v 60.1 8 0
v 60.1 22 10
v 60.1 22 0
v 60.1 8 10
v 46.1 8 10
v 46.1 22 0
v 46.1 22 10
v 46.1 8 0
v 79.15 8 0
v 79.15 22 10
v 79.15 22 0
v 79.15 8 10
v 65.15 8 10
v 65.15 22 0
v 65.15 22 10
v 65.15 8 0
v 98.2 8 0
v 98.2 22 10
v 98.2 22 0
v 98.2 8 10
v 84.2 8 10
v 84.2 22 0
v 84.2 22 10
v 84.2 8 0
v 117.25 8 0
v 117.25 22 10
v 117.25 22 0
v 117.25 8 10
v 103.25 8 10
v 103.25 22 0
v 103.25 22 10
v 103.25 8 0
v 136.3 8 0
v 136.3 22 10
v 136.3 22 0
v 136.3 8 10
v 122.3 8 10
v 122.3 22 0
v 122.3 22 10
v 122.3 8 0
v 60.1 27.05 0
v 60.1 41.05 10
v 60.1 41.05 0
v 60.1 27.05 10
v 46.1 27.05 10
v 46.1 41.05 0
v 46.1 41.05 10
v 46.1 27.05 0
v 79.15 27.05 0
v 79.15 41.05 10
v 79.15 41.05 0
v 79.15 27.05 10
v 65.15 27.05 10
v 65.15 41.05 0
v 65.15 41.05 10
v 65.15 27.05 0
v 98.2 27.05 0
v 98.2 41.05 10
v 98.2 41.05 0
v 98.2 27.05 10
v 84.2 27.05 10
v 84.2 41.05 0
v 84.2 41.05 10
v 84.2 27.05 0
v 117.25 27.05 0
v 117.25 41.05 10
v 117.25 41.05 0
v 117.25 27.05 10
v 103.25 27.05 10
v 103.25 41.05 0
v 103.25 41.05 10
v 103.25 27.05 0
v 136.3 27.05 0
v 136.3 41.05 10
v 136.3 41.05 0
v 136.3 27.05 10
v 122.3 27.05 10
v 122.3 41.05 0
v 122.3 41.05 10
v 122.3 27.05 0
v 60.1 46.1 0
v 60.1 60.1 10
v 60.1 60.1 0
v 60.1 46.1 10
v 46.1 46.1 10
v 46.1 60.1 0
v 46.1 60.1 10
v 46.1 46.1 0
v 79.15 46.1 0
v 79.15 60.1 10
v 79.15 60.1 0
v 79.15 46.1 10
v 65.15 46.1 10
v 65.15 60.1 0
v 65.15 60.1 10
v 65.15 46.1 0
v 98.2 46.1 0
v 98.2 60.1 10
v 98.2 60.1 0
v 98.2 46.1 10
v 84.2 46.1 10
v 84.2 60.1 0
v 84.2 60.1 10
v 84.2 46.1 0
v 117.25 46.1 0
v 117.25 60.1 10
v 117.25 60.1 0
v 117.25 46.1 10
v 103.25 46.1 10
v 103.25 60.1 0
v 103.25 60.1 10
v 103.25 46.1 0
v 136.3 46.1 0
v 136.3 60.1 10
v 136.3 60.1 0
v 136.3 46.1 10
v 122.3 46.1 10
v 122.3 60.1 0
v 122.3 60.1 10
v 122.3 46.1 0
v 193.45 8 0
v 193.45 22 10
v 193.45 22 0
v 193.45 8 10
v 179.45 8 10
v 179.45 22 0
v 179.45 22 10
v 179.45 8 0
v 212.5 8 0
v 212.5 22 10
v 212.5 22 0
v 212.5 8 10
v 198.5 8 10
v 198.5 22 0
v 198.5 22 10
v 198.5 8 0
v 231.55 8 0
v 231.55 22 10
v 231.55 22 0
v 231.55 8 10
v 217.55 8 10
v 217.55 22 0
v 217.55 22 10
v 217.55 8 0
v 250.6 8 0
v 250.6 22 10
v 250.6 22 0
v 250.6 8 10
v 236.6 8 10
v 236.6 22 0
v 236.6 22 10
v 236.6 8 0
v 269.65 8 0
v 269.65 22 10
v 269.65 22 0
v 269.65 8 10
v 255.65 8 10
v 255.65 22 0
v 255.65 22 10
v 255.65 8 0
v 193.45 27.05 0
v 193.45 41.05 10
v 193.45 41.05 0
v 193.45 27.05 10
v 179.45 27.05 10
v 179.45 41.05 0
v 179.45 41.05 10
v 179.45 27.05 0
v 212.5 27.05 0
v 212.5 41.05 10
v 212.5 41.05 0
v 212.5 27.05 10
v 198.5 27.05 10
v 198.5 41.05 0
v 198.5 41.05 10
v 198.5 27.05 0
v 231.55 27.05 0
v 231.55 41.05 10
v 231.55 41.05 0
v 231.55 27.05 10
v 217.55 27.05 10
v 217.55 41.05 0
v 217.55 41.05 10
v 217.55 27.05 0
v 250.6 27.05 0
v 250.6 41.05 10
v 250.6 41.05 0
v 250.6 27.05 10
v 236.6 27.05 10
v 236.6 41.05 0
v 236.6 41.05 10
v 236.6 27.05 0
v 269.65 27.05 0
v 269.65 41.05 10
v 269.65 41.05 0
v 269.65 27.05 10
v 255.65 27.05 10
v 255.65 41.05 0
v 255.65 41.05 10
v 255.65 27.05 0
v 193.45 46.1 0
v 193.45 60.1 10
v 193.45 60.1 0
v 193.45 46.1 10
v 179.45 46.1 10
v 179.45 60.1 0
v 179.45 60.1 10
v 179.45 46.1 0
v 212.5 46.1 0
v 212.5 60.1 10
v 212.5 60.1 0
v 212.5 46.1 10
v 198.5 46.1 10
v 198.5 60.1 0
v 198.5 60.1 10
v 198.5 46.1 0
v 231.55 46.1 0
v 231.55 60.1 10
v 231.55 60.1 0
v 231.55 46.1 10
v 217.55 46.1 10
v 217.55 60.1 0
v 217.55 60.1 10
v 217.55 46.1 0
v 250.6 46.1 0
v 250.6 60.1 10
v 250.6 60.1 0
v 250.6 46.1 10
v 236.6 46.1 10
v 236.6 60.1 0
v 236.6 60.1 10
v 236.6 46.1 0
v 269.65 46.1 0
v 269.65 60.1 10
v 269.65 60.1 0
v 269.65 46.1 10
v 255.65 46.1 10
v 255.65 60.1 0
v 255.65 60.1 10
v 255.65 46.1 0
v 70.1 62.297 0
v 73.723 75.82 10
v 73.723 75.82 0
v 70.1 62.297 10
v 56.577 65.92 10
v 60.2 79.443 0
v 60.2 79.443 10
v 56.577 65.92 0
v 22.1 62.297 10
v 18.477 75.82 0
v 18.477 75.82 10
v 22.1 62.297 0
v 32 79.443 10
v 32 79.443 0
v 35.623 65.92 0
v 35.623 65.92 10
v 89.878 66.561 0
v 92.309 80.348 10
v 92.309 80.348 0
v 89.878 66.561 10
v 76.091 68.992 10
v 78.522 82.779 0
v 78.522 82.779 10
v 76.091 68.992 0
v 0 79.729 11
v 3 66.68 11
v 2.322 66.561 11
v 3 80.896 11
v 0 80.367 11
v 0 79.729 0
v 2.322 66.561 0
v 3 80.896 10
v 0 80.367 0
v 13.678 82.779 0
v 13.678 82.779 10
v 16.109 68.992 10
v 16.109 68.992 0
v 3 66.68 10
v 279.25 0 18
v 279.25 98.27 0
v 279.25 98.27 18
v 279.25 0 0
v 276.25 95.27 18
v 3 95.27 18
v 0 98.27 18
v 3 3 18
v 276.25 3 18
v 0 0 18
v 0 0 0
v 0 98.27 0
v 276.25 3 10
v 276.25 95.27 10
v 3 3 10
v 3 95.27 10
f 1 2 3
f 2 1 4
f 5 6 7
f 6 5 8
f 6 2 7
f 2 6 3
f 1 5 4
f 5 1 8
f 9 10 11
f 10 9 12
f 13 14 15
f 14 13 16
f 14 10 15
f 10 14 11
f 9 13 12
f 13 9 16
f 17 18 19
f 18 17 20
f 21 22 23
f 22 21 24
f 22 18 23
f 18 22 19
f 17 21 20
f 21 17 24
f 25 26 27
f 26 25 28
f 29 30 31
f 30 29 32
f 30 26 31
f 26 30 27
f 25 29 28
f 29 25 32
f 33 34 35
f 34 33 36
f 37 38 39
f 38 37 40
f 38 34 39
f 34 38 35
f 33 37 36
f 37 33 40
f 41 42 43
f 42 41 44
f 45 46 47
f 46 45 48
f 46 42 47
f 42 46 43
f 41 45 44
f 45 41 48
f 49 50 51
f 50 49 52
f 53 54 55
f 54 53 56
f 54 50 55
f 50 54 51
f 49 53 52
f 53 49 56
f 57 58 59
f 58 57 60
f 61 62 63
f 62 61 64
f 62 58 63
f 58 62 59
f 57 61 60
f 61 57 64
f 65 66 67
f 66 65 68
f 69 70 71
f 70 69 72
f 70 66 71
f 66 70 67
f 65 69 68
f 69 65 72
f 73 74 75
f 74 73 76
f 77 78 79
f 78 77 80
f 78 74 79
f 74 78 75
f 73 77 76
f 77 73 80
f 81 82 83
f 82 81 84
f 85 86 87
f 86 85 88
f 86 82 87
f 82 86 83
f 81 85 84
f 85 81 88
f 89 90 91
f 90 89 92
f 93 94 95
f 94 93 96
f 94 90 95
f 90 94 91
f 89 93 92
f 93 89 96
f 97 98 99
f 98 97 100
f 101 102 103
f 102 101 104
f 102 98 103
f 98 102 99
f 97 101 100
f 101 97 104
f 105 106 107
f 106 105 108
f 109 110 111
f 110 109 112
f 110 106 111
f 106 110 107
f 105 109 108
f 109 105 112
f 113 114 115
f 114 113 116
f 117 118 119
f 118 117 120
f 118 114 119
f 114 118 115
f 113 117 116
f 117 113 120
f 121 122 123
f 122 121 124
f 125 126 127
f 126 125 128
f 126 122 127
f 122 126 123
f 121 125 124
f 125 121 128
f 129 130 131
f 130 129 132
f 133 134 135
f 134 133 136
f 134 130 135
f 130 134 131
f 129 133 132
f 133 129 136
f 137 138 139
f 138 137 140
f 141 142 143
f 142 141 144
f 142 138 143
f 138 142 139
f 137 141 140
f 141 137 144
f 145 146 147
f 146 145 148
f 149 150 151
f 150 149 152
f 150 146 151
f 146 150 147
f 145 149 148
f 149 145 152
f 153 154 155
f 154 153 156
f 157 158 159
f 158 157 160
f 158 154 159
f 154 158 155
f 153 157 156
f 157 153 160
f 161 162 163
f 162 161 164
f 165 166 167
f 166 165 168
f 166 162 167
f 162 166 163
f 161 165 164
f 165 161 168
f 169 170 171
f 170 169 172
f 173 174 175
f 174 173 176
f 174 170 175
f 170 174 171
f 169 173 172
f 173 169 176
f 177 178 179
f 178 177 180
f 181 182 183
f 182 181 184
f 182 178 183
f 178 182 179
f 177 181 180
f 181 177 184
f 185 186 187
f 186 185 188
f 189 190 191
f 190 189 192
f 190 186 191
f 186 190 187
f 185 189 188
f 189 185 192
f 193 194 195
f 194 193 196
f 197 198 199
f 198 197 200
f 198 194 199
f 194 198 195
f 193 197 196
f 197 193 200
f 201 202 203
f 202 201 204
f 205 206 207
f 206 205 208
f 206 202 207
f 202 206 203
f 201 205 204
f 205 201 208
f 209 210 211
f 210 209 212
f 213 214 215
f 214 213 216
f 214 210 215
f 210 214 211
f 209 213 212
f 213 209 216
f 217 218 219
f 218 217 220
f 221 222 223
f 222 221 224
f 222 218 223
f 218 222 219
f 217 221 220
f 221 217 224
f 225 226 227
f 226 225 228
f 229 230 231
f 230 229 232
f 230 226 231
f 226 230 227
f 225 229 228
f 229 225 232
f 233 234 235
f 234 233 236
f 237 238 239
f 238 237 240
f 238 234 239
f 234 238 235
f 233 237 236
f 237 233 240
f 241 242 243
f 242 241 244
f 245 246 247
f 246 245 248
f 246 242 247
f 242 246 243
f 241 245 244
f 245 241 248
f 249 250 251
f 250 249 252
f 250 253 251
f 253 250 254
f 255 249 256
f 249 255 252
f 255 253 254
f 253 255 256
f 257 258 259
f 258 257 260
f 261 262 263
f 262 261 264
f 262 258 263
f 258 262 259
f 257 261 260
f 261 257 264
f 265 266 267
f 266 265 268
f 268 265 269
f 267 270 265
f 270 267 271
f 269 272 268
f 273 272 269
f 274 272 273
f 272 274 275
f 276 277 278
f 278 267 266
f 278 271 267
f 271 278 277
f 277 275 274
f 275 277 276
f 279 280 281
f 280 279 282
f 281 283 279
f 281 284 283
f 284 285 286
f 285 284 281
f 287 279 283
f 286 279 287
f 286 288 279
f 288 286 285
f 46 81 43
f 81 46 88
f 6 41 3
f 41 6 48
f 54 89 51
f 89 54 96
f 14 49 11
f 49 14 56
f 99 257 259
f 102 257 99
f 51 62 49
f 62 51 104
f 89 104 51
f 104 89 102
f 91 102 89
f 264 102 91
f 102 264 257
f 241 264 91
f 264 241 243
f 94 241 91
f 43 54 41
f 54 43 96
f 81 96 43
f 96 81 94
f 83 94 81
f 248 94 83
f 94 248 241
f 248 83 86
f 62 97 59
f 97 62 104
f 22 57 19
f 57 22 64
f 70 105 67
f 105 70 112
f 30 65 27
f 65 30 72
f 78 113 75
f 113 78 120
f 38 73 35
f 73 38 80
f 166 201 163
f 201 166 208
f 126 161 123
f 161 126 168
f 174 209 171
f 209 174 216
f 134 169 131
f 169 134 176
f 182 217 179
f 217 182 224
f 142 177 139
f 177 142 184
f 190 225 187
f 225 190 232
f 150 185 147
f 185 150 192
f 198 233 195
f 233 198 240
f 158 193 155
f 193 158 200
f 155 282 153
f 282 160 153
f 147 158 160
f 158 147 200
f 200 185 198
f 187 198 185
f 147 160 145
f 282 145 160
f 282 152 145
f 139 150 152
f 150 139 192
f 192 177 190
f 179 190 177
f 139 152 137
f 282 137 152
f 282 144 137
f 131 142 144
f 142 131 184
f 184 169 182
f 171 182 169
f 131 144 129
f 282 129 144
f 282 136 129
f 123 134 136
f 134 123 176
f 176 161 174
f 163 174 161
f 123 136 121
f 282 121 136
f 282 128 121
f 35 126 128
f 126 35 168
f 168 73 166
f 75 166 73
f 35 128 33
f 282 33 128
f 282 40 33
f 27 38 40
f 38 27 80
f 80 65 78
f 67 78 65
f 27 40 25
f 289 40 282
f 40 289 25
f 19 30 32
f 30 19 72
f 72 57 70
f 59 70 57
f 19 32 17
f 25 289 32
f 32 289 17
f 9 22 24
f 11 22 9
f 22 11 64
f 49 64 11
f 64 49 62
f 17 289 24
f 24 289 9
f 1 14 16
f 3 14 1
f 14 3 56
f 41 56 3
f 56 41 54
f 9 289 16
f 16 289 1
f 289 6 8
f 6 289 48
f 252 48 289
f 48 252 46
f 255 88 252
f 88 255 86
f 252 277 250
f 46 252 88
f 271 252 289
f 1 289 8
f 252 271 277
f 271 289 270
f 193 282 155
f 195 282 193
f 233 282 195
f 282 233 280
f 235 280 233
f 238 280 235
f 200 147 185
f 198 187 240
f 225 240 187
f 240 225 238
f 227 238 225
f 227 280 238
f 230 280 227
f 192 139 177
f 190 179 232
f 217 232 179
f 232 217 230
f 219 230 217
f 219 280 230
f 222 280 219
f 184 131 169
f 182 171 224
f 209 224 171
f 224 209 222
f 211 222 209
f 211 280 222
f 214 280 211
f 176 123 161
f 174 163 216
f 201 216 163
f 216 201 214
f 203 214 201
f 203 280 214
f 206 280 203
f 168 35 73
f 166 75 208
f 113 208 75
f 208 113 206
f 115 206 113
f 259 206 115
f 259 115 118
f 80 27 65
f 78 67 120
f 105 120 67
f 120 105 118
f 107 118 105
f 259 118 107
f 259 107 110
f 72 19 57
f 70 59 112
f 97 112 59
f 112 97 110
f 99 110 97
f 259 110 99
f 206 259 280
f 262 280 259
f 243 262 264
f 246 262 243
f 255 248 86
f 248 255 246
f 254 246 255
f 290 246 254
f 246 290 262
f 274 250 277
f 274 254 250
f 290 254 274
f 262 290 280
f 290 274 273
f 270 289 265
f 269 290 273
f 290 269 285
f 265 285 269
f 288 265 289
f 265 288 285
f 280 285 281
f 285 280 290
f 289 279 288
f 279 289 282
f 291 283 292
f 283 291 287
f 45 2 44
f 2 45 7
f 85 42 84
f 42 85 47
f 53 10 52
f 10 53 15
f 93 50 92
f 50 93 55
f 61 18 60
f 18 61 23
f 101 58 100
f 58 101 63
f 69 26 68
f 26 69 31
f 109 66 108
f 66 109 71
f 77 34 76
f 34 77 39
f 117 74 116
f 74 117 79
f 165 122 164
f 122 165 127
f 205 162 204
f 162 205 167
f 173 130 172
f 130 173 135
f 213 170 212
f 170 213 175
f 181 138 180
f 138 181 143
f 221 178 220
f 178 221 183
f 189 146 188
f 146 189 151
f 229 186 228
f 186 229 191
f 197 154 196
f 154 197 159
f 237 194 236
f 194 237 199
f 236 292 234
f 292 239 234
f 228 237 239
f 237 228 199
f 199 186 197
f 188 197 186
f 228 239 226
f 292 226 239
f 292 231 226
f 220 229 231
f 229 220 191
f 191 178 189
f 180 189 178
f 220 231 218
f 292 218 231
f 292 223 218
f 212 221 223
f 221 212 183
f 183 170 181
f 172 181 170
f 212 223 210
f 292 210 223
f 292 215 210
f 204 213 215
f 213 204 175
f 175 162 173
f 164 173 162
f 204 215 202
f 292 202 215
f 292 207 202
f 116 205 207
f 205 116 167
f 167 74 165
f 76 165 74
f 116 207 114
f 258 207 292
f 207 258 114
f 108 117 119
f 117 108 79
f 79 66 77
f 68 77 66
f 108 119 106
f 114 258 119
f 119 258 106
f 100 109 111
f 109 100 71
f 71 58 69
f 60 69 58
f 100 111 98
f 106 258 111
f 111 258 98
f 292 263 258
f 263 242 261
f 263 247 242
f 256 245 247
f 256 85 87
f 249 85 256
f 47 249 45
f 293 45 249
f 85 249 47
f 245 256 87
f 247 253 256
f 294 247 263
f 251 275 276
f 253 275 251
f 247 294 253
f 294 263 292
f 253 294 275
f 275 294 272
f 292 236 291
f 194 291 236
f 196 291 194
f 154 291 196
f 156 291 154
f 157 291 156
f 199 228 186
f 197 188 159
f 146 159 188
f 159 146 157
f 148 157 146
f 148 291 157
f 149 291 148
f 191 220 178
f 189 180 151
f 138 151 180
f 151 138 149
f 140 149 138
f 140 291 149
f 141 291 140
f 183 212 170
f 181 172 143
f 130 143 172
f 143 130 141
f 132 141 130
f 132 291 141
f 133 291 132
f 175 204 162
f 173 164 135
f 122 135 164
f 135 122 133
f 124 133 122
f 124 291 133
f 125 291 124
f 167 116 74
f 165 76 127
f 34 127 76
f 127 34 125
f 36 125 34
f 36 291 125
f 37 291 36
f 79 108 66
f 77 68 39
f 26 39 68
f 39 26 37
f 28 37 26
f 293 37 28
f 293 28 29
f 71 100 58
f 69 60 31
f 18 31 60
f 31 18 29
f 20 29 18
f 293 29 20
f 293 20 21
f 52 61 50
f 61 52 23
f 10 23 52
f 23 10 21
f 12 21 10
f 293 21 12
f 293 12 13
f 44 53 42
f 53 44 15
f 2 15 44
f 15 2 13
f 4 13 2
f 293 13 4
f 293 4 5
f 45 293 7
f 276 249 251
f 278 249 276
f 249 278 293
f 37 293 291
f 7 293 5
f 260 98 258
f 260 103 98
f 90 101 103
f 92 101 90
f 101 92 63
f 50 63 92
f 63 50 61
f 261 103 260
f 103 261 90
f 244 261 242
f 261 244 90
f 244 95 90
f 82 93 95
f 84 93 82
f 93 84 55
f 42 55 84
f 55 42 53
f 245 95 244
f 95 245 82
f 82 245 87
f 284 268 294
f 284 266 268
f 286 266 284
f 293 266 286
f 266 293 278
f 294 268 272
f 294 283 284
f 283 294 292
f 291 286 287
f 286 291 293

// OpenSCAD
// Generated keyboard case
// Layout: Custom (34 keys)
// Switch type: Cherry MX
// Split keyboard: unified case

// Parameters
case_width = 279.25;
case_height = 98.27;
case_depth = 18.00;
wall_thickness = 3.00;
base_height = 10.00;
switch_cutout_size = 14.00;
key_spacing = 19.05;

module keyboard_case() {
    difference() {
        // Outer shell
        translate([0, 0, 0])
            cube([case_width, case_height, case_depth]);

        // Inner cavity
        translate([wall_thickness, wall_thickness, base_height])
            cube([case_width - 2*wall_thickness, 
                  case_height - 2*wall_thickness, 
                  case_depth - base_height + 1]);

        // Switch cutouts
        translate([wall_thickness + 5 - -38.10, wall_thickness + 5 - 0.00, -1])
            switch_plate();
    }
}

module switch_plate() {
    translate([0.00, 0.00, 0])
        cube([switch_cutout_size, switch_cutout_size, base_height + 2]);
    translate([19.05, 0.00, 0])
        cube([switch_cutout_size, switch_cutout_size, base_height + 2]);
    translate([38.10, 0.00, 0])
        cube([switch_cutout_size, switch_cutout_size, base_height + 2]);
    translate([57.15, 0.00, 0])
        cube([switch_cutout_size, switch_cutout_size, base_height + 2]);
    translate([76.20, 0.00, 0])
        cube([switch_cutout_size, switch_cutout_size, base_height + 2]);
    translate([0.00, 19.05, 0])
        cube([switch_cutout_size, switch_cutout_size, base_height + 2]);
    translate([19.05, 19.05, 0])
        cube([switch_cutout_size, switch_cutout_size, base_height + 2]);
    translate([38.10, 19.05, 0])
        cube([switch_cutout_size, switch_cutout_size, base_height + 2]);
    translate([57.15, 19.05, 0])
        cube([switch_cutout_size, switch_cutout_size, base_height + 2]);
    translate([76.20, 19.05, 0])
        cube([switch_cutout_size, switch_cutout_size, base_height + 2]);
    translate([0.00, 38.10, 0])
        cube([switch_cutout_size, switch_cutout_size, base_height + 2]);
    translate([19.05, 38.10, 0])
        cube([switch_cutout_size, switch_cutout_size, base_height + 2]);
    translate([38.10, 38.10, 0])
        cube([switch_cutout_size, switch_cutout_size, base_height + 2]);
    translate([57.15, 38.10, 0])
        cube([switch_cutout_size, switch_cutout_size, base_height + 2]);
    translate([76.20, 38.10, 0])
        cube([switch_cutout_size, switch_cutout_size, base_height + 2]);
    translate([133.35, 0.00, 0])
        cube([switch_cutout_size, switch_cutout_size, base_height + 2]);
    translate([152.40, 0.00, 0])
        cube([switch_cutout_size, switch_cutout_size, base_height + 2]);
    translate([171.45, 0.00, 0])
        cube([switch_cutout_size, switch_cutout_size, base_height + 2]);
    translate([190.50, 0.00, 0])
        cube([switch_cutout_size, switch_cutout_size, base_height + 2]);
    translate([209.55, 0.00, 0])
        cube([switch_cutout_size, switch_cutout_size, base_height + 2]);
    translate([133.35, 19.05, 0])
        cube([switch_cutout_size, switch_cutout_size, base_height + 2]);
    translate([152.40, 19.05, 0])
        cube([switch_cutout_size, switch_cutout_size, base_height + 2]);
    translate([171.45, 19.05, 0])
        cube([switch_cutout_size, switch_cutout_size, base_height + 2]);
    translate([190.50, 19.05, 0])
        cube([switch_cutout_size, switch_cutout_size, base_height + 2]);
    translate([209.55, 19.05, 0])
        cube([switch_cutout_size, switch_cutout_size, base_height + 2]);
    translate([133.35, 38.10, 0])
        cube([switch_cutout_size, switch_cutout_size, base_height + 2]);
    translate([152.40, 38.10, 0])
        cube([switch_cutout_size, switch_cutout_size, base_height + 2]);
    translate([171.45, 38.10, 0])
        cube([switch_cutout_size, switch_cutout_size, base_height + 2]);
    translate([190.50, 38.10, 0])
        cube([switch_cutout_size, switch_cutout_size, base_height + 2]);
    translate([209.55, 38.10, 0])
        cube([switch_cutout_size, switch_cutout_size, base_height + 2]);
    translate([19.05, 62.87, 0])
        rotate([0, 0, -15.00])
            translate([-7.00, -7.00, 0])
                cube([switch_cutout_size, switch_cutout_size, base_height + 2]);
    translate([-19.05, 62.87, 0])
        rotate([0, 0, 15.00])
            translate([-7.00, -7.00, 0])
                cube([switch_cutout_size, switch_cutout_size, base_height + 2]);
    translate([38.10, 66.67, 0])
        rotate([0, 0, -10.00])
            translate([-7.00, -7.00, 0])
                cube([switch_cutout_size, switch_cutout_size, base_height + 2]);
    translate([-38.10, 66.67, 0])
        rotate([0, 0, 10.00])
            translate([-7.00, -7.00, 0])
                cube([switch_cutout_size, switch_cutout_size, base_height + 2]);
}

// Generate the case
keyboard_case();
